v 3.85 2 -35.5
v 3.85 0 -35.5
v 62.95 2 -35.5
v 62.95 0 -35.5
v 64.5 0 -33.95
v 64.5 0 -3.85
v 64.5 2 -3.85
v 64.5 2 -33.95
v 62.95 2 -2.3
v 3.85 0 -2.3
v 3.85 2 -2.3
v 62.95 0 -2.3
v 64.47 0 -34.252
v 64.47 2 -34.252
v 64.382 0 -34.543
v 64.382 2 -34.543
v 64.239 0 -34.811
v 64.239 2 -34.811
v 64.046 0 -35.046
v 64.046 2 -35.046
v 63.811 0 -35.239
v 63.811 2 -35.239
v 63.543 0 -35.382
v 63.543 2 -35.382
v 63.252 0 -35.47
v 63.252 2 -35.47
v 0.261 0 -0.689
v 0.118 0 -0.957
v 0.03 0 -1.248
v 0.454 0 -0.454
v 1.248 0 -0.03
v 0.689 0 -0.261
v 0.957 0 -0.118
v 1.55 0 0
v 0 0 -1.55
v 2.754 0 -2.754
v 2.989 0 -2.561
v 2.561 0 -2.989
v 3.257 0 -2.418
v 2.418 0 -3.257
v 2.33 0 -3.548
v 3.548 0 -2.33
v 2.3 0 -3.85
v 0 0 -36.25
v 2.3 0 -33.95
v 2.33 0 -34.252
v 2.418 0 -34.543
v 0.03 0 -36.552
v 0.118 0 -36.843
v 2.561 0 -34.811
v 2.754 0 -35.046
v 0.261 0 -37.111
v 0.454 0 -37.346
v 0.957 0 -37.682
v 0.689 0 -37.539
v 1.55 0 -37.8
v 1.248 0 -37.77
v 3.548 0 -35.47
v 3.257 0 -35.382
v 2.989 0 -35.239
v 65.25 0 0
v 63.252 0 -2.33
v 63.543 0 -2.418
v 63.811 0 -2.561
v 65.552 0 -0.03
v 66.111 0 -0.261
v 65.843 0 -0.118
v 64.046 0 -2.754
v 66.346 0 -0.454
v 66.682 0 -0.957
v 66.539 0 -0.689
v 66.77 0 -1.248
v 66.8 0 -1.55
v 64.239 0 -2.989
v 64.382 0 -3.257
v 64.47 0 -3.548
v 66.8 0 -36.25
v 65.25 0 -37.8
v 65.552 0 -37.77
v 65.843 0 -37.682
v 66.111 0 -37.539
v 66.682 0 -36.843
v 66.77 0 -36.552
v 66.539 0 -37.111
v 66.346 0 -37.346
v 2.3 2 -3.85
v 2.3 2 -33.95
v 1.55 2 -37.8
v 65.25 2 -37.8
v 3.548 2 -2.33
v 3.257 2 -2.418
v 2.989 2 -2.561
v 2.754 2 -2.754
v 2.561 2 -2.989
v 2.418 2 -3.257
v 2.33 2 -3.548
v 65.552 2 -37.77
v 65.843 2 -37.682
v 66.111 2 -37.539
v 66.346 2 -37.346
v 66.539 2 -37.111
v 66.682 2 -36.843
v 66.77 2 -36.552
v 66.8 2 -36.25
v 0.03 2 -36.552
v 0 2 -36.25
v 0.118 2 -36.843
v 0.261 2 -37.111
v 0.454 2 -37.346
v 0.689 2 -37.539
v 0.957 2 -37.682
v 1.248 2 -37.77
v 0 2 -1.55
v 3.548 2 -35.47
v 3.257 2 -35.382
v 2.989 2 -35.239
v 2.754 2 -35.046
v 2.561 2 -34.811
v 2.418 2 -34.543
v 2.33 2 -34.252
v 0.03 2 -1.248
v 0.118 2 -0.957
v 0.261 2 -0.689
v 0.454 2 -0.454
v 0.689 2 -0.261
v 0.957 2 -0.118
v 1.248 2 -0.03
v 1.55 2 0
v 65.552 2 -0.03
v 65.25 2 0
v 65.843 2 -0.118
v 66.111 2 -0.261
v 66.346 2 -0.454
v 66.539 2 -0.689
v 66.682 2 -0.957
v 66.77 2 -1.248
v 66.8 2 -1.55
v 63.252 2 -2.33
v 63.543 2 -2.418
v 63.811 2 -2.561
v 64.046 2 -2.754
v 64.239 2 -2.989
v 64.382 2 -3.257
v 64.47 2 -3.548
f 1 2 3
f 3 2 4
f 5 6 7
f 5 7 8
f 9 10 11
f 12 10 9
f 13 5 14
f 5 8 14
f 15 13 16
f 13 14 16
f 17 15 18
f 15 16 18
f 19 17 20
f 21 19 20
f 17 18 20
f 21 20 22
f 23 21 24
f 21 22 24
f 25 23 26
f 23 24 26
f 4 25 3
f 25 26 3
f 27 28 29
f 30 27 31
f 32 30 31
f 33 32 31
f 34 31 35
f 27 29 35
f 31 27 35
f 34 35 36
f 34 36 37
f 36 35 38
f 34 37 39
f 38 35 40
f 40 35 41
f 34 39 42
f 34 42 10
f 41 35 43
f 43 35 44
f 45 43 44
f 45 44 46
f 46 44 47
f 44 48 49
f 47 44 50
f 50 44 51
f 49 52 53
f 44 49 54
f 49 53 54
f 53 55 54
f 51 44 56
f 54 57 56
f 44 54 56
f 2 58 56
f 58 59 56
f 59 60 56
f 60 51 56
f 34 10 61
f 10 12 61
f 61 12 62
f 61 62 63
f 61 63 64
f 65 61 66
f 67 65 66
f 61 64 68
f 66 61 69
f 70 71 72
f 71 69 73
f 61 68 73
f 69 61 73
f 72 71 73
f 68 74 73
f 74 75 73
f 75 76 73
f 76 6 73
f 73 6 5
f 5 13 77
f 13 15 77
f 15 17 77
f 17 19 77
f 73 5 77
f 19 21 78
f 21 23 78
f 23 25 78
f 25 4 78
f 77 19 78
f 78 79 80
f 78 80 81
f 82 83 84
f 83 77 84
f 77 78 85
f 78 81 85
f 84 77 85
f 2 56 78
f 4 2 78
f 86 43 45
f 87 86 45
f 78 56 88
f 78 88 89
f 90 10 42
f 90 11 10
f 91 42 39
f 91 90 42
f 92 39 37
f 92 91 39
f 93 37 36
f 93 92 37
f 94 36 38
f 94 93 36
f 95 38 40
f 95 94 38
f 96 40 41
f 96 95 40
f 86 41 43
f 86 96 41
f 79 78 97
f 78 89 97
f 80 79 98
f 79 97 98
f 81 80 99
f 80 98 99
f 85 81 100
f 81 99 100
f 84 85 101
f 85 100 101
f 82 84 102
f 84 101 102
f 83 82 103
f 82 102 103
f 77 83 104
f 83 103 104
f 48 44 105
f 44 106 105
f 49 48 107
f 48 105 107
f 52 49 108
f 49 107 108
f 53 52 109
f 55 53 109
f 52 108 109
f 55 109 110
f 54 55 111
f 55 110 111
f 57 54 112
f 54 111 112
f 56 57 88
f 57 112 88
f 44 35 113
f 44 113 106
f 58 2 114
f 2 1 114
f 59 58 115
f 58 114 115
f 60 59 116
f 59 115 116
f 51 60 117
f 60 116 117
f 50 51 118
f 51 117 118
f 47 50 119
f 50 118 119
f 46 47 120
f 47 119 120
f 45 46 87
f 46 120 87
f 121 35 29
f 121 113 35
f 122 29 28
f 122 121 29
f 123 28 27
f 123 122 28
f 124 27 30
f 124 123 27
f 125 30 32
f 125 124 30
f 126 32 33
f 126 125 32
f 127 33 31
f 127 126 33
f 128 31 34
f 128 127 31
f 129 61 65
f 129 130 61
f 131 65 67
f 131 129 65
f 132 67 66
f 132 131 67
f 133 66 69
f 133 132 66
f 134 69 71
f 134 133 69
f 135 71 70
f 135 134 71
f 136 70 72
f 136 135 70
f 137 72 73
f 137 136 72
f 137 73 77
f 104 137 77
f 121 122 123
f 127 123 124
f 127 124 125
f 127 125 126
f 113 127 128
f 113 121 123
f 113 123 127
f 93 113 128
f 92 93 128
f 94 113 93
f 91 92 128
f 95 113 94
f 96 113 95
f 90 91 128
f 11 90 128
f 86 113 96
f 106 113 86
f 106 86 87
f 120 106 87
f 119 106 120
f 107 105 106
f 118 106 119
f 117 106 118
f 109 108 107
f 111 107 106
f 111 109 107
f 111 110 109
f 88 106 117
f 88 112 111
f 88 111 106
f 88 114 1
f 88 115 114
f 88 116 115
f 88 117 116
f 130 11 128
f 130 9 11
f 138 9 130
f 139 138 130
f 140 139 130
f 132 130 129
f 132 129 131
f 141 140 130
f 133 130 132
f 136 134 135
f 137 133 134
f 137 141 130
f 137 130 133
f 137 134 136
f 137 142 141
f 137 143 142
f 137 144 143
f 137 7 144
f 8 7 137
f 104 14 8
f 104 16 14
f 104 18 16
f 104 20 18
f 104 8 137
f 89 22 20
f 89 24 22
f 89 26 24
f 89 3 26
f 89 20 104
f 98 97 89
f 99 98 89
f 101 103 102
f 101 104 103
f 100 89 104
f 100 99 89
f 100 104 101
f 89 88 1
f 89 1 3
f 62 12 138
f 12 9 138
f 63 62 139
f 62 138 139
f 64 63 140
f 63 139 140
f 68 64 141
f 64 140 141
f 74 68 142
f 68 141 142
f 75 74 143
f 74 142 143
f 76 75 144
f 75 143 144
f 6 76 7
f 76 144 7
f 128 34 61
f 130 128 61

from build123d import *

# Parameters (mm, degrees)
SKETCH1_W           = 66.8
SKETCH1_H           = 37.8
SKETCH1_W_2         = 62.2
SKETCH1_H_2         = 33.2
BOSS_EXTRUDE1_DEPTH = 2
FILLET1_R           = 1.55


with BuildPart() as part:
    # Sketch1 → Boss-Extrude1 (new body)
    with BuildSketch(Plane(origin=(0, 0, 0), x_dir=(1, 0, 0), z_dir=(0, 1, 0))):
        with Locations((33.4, 18.9)):
            Rectangle(SKETCH1_W, SKETCH1_H)
        with Locations((33.4, 18.9)):
            Rectangle(SKETCH1_W_2, SKETCH1_H_2, mode=Mode.SUBTRACT)
    extrude(amount=BOSS_EXTRUDE1_DEPTH)

    # Fillet1
    fillet1_edges = [part.edges().sort_by_distance(p)[0] for p in [
        (2.3, 1, -35.5),
        (2.3, 1, -2.3),
        (64.5, 1, -2.3),
        (64.5, 1, -35.5),
        (0, 1, -37.8),
        (66.8, 1, -37.8),
        (66.8, 1, 0),
        (0, 1, 0),
    ]]
    fillet(fillet1_edges, radius=FILLET1_R)


solid = part.part
